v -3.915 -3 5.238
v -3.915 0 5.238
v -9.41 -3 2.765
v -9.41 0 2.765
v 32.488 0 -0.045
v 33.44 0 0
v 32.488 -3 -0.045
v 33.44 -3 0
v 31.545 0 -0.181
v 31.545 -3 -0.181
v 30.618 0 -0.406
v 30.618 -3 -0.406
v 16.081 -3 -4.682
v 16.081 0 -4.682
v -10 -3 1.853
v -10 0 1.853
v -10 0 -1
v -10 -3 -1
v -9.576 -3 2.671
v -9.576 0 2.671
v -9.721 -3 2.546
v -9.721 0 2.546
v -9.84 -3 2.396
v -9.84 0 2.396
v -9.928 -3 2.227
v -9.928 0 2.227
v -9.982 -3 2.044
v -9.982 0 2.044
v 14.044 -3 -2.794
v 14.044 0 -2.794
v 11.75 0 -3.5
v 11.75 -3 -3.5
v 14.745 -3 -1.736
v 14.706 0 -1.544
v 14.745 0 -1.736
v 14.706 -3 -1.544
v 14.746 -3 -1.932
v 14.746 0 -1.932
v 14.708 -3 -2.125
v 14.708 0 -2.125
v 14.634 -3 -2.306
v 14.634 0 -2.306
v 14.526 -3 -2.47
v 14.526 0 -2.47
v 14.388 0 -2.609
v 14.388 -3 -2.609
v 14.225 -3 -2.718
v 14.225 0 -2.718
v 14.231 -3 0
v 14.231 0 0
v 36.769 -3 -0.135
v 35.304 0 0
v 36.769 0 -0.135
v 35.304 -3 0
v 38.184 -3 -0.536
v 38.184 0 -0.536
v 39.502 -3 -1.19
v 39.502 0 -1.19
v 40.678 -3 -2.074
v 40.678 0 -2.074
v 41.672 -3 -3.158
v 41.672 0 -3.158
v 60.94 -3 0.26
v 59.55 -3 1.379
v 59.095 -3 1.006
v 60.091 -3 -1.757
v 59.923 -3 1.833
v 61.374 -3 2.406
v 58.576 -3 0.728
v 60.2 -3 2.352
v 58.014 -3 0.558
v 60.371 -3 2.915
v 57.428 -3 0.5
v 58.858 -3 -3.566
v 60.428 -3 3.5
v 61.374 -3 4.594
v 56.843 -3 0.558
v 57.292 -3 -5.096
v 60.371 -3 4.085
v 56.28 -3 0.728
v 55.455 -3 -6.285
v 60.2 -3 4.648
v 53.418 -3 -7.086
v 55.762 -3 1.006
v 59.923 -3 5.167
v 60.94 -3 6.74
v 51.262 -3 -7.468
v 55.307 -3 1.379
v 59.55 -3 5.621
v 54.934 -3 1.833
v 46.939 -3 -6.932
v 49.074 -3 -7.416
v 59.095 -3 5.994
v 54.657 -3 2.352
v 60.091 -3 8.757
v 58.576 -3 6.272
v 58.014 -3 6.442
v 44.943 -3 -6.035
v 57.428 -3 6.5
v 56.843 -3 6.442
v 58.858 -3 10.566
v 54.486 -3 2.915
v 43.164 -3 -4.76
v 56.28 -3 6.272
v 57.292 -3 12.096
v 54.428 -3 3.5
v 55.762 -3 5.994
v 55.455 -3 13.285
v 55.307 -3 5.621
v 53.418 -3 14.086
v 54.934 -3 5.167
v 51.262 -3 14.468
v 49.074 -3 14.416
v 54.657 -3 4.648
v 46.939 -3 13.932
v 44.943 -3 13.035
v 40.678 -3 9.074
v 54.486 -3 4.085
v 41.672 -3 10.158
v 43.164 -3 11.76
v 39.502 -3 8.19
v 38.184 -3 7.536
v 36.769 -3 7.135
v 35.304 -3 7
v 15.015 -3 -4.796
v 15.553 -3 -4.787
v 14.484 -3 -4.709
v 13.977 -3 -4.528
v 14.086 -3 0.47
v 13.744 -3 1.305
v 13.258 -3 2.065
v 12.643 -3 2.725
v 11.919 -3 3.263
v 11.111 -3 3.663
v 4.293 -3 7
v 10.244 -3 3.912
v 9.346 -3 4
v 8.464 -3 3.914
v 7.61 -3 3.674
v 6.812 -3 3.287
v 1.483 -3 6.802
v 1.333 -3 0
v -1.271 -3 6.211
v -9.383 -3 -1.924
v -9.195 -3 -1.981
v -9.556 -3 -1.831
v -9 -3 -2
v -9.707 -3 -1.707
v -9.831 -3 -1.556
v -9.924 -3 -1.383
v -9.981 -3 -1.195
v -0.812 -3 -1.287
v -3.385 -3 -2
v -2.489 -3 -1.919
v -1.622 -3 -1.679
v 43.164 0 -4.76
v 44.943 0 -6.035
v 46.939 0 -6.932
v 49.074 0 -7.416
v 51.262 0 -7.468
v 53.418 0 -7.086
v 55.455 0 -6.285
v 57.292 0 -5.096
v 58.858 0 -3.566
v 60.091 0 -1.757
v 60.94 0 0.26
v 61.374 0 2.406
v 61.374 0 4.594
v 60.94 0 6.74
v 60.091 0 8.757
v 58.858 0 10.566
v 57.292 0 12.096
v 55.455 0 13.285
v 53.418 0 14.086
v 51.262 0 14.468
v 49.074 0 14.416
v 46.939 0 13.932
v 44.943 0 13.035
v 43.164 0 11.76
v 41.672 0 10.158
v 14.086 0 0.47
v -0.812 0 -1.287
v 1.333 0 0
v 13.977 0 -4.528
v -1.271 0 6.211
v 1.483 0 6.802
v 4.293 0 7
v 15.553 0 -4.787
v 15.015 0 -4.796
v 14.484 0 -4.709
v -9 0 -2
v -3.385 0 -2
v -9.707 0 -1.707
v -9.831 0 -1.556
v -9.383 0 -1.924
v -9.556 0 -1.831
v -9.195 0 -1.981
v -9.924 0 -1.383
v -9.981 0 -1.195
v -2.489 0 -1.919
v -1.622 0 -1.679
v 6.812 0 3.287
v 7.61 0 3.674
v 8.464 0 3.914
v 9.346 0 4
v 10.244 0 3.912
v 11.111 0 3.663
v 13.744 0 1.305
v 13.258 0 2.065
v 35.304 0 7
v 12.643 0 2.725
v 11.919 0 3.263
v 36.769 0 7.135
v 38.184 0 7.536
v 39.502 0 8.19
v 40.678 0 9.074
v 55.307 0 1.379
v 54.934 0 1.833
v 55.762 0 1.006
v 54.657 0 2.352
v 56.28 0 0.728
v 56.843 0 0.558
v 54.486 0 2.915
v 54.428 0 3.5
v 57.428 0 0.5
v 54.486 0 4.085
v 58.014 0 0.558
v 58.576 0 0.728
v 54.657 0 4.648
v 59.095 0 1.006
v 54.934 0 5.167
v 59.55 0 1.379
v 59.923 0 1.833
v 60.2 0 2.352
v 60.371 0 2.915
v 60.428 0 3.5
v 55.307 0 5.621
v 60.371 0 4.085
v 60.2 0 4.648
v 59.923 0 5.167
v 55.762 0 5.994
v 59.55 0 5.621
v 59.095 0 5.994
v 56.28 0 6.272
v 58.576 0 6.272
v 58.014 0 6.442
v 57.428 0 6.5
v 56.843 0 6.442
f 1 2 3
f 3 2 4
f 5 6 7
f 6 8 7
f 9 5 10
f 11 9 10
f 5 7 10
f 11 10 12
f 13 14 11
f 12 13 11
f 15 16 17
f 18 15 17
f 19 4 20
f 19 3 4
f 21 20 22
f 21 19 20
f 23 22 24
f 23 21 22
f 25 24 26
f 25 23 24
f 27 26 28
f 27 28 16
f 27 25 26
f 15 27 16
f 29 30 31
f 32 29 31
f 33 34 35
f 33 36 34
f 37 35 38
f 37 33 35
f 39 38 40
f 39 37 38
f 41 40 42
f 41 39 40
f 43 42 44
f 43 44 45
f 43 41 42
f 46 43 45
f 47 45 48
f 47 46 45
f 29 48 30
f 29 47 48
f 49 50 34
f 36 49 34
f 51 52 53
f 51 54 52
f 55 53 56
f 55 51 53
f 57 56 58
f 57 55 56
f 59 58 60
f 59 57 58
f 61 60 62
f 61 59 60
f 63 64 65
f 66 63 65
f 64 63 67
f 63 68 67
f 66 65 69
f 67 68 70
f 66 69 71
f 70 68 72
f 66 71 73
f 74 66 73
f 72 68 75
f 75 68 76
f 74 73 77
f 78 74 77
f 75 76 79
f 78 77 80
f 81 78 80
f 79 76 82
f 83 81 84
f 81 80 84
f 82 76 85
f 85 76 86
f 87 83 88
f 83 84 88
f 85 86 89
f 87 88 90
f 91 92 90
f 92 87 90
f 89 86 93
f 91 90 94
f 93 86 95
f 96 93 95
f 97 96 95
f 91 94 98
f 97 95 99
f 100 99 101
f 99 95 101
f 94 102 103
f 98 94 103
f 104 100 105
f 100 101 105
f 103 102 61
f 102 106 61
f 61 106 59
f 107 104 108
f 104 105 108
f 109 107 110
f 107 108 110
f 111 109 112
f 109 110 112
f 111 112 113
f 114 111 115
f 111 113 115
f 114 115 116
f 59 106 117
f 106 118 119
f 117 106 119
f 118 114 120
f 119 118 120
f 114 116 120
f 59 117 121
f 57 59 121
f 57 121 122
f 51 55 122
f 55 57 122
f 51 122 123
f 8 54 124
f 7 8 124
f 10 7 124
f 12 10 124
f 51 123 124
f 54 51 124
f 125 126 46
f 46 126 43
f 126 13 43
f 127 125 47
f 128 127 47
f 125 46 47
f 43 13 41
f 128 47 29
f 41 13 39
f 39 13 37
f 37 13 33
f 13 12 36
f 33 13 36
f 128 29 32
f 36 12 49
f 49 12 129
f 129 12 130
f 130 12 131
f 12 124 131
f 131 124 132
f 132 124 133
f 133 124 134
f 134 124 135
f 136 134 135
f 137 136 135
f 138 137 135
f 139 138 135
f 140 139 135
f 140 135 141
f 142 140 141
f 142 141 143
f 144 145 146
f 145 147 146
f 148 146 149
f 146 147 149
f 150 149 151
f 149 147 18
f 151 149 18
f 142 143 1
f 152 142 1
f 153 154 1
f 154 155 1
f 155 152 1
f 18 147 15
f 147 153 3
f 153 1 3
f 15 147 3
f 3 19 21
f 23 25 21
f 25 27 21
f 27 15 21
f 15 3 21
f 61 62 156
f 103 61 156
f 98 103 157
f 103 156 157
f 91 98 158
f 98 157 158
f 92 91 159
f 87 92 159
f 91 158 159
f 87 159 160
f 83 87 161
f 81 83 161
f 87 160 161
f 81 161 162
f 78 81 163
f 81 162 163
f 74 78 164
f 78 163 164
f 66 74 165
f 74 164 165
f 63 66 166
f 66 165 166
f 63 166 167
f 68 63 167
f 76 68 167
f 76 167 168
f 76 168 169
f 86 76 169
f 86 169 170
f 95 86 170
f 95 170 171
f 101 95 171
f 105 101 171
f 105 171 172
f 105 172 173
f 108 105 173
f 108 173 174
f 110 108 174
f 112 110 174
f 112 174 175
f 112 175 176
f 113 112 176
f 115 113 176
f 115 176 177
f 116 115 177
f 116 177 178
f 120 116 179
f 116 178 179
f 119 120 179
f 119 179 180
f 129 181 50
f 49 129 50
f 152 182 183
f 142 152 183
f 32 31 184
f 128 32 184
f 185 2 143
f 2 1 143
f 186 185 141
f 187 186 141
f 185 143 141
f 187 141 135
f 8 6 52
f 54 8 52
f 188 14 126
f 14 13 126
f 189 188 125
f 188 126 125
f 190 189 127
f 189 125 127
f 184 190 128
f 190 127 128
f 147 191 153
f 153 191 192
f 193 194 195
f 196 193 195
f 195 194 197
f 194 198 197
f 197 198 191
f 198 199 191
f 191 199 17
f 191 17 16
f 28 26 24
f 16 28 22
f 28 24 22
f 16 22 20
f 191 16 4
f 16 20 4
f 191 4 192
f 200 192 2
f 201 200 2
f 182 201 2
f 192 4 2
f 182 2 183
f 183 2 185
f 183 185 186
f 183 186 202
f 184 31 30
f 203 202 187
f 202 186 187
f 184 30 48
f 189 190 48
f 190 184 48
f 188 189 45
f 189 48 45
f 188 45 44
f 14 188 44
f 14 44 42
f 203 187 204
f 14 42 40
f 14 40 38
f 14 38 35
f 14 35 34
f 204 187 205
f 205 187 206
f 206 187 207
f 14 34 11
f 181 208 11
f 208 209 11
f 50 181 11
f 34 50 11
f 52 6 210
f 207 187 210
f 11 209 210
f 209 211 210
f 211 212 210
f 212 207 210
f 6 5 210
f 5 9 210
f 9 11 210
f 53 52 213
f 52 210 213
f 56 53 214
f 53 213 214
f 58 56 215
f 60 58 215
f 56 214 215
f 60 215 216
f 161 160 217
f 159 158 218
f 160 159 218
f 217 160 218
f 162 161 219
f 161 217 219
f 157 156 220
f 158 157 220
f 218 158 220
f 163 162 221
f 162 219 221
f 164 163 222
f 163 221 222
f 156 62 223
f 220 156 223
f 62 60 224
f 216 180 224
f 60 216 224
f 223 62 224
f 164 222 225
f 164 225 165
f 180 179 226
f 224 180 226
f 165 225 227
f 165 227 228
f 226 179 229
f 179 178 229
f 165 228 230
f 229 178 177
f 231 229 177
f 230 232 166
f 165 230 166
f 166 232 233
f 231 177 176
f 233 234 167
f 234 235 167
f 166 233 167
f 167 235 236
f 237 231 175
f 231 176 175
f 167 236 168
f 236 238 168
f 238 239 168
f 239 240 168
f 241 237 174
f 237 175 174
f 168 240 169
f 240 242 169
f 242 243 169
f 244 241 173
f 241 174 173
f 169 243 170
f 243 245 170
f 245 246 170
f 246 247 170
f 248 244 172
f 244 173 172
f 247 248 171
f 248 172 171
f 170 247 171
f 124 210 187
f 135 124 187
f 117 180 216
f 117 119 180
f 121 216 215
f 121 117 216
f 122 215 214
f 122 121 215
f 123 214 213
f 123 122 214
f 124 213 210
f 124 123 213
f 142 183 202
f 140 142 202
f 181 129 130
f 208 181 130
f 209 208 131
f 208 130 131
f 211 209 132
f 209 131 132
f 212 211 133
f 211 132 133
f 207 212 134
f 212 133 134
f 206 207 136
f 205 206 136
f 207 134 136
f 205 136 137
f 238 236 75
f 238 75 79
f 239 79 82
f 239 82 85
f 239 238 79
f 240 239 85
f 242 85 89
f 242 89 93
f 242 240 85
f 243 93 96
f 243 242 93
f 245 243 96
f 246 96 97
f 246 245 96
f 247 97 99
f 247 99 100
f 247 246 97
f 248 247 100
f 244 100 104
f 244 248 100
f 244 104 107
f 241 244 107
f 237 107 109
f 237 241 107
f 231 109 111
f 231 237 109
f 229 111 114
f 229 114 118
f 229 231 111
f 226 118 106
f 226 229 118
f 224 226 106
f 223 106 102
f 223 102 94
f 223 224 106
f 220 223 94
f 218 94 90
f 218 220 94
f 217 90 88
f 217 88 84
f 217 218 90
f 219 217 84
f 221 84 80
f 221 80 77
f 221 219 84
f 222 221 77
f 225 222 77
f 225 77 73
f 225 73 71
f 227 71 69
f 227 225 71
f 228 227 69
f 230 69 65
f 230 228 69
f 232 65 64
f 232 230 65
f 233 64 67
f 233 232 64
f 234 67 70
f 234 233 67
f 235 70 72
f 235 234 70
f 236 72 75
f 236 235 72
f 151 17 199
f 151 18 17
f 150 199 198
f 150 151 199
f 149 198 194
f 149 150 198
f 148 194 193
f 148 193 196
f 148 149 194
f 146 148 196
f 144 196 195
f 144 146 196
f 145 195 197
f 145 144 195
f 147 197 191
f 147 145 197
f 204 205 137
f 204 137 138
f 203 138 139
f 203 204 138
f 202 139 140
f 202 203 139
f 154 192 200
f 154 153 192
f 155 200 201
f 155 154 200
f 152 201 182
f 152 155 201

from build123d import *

# Parameters (mm, degrees)
F0_R        = 3
F1_DEPTH    = 3
F2_R        = 10
F3_R        = 5
F4_R        = 1
F5_T1_DEPTH = 3
F6_R        = 20
F7_R        = 1
F8_R        = 3
F9_R        = 8


# Not quite as in the source:
# - a fillet or chamfer that OpenCascade refuses, or shapes differently, is made with other operations: its cross-section is extruded or revolved along the edge and cut away or added
# - a feature names something its author has since deleted; it is built from what else it names


with BuildPart() as f1:
    # F0 (on Front) → F1 (new body)
    with BuildSketch(Plane.XZ):
        Polygon((-2, -2), (1.3333333333, 0), (0, 0), (0, 7), (-10, 2.5), (-10, -2), align=None)
        Polygon((14.2307692308, 0), (32, 0), (40, 0), (40, 7), (0, 7), (0, 0), (1.3333333333, 0), (8, 4), (13, 4), align=None)
        Polygon((15, -5), (32, 0), (14.2307692308, 0), (15, -2.5), (11.75, -3.5), align=None)
        with BuildLine():
            Line((40, 7), (40, 0))
            ThreePointArc((40, 0), (61.4283268073, 3.5), (40, 7))
        make_face()
        with Locations((57.4283268073, 3.5)):
            Circle(F0_R, mode=Mode.SUBTRACT)
    extrude(amount=F1_DEPTH)

    # F2
    f2_edges = [f1.edges().sort_by_distance(p)[0] for p in [
        (32, -1.5, 0),
    ]]
    fillet(f2_edges, radius=F2_R)

    # F3
    f3_edges = [f1.edges().sort_by_distance(p)[0] for p in [
        (13, -1.5, 4),
        (-2, -1.5, -2),
    ]]
    fillet(f3_edges, radius=F3_R)

    # F4
    f4_edges = [f1.edges().sort_by_distance(p)[0] for p in [
        (15, -1.5, -2.5),
    ]]
    fillet(f4_edges, radius=F4_R)

    # F5: fillet of radius 5 on 1 edges, made by hand

    # F5_s2 → F5_t1 (join)
    with BuildSketch(Plane.XZ):
        with BuildLine():
            ThreePointArc((9.3849198247, 4), (8.0502519153, 3.8185746411), (6.8124410476, 3.2874646286))
            Line((6.8124410476, 3.2874646286), (8, 4))
            Line((8, 4), (9.3849198247, 4))
        make_face()
    extrude(amount=F5_T1_DEPTH)

    # F6
    f6_edges = [f1.edges().sort_by_distance(p)[0] for p in [
        (0, -1.5, 7),
    ]]
    fillet(f6_edges, radius=F6_R)

    # F7
    f7_edges = [f1.edges().sort_by_distance(p)[0] for p in [
        (-10, -1.5, 2.5),
        (-10, -1.5, -2),
    ]]
    fillet(f7_edges, radius=F7_R)

    # F8
    f8_edges = [f1.edges().sort_by_distance(p)[0] for p in [
        (15, -1.5, -5),
    ]]
    fillet(f8_edges, radius=F8_R)

    # F9
    f9_edges = [f1.edges().sort_by_distance(p)[0] for p in [
        (40, -1.5, 7),
        (40, -1.5, 0),
    ]]
    fillet(f9_edges, radius=F9_R)


solid = f1.part
